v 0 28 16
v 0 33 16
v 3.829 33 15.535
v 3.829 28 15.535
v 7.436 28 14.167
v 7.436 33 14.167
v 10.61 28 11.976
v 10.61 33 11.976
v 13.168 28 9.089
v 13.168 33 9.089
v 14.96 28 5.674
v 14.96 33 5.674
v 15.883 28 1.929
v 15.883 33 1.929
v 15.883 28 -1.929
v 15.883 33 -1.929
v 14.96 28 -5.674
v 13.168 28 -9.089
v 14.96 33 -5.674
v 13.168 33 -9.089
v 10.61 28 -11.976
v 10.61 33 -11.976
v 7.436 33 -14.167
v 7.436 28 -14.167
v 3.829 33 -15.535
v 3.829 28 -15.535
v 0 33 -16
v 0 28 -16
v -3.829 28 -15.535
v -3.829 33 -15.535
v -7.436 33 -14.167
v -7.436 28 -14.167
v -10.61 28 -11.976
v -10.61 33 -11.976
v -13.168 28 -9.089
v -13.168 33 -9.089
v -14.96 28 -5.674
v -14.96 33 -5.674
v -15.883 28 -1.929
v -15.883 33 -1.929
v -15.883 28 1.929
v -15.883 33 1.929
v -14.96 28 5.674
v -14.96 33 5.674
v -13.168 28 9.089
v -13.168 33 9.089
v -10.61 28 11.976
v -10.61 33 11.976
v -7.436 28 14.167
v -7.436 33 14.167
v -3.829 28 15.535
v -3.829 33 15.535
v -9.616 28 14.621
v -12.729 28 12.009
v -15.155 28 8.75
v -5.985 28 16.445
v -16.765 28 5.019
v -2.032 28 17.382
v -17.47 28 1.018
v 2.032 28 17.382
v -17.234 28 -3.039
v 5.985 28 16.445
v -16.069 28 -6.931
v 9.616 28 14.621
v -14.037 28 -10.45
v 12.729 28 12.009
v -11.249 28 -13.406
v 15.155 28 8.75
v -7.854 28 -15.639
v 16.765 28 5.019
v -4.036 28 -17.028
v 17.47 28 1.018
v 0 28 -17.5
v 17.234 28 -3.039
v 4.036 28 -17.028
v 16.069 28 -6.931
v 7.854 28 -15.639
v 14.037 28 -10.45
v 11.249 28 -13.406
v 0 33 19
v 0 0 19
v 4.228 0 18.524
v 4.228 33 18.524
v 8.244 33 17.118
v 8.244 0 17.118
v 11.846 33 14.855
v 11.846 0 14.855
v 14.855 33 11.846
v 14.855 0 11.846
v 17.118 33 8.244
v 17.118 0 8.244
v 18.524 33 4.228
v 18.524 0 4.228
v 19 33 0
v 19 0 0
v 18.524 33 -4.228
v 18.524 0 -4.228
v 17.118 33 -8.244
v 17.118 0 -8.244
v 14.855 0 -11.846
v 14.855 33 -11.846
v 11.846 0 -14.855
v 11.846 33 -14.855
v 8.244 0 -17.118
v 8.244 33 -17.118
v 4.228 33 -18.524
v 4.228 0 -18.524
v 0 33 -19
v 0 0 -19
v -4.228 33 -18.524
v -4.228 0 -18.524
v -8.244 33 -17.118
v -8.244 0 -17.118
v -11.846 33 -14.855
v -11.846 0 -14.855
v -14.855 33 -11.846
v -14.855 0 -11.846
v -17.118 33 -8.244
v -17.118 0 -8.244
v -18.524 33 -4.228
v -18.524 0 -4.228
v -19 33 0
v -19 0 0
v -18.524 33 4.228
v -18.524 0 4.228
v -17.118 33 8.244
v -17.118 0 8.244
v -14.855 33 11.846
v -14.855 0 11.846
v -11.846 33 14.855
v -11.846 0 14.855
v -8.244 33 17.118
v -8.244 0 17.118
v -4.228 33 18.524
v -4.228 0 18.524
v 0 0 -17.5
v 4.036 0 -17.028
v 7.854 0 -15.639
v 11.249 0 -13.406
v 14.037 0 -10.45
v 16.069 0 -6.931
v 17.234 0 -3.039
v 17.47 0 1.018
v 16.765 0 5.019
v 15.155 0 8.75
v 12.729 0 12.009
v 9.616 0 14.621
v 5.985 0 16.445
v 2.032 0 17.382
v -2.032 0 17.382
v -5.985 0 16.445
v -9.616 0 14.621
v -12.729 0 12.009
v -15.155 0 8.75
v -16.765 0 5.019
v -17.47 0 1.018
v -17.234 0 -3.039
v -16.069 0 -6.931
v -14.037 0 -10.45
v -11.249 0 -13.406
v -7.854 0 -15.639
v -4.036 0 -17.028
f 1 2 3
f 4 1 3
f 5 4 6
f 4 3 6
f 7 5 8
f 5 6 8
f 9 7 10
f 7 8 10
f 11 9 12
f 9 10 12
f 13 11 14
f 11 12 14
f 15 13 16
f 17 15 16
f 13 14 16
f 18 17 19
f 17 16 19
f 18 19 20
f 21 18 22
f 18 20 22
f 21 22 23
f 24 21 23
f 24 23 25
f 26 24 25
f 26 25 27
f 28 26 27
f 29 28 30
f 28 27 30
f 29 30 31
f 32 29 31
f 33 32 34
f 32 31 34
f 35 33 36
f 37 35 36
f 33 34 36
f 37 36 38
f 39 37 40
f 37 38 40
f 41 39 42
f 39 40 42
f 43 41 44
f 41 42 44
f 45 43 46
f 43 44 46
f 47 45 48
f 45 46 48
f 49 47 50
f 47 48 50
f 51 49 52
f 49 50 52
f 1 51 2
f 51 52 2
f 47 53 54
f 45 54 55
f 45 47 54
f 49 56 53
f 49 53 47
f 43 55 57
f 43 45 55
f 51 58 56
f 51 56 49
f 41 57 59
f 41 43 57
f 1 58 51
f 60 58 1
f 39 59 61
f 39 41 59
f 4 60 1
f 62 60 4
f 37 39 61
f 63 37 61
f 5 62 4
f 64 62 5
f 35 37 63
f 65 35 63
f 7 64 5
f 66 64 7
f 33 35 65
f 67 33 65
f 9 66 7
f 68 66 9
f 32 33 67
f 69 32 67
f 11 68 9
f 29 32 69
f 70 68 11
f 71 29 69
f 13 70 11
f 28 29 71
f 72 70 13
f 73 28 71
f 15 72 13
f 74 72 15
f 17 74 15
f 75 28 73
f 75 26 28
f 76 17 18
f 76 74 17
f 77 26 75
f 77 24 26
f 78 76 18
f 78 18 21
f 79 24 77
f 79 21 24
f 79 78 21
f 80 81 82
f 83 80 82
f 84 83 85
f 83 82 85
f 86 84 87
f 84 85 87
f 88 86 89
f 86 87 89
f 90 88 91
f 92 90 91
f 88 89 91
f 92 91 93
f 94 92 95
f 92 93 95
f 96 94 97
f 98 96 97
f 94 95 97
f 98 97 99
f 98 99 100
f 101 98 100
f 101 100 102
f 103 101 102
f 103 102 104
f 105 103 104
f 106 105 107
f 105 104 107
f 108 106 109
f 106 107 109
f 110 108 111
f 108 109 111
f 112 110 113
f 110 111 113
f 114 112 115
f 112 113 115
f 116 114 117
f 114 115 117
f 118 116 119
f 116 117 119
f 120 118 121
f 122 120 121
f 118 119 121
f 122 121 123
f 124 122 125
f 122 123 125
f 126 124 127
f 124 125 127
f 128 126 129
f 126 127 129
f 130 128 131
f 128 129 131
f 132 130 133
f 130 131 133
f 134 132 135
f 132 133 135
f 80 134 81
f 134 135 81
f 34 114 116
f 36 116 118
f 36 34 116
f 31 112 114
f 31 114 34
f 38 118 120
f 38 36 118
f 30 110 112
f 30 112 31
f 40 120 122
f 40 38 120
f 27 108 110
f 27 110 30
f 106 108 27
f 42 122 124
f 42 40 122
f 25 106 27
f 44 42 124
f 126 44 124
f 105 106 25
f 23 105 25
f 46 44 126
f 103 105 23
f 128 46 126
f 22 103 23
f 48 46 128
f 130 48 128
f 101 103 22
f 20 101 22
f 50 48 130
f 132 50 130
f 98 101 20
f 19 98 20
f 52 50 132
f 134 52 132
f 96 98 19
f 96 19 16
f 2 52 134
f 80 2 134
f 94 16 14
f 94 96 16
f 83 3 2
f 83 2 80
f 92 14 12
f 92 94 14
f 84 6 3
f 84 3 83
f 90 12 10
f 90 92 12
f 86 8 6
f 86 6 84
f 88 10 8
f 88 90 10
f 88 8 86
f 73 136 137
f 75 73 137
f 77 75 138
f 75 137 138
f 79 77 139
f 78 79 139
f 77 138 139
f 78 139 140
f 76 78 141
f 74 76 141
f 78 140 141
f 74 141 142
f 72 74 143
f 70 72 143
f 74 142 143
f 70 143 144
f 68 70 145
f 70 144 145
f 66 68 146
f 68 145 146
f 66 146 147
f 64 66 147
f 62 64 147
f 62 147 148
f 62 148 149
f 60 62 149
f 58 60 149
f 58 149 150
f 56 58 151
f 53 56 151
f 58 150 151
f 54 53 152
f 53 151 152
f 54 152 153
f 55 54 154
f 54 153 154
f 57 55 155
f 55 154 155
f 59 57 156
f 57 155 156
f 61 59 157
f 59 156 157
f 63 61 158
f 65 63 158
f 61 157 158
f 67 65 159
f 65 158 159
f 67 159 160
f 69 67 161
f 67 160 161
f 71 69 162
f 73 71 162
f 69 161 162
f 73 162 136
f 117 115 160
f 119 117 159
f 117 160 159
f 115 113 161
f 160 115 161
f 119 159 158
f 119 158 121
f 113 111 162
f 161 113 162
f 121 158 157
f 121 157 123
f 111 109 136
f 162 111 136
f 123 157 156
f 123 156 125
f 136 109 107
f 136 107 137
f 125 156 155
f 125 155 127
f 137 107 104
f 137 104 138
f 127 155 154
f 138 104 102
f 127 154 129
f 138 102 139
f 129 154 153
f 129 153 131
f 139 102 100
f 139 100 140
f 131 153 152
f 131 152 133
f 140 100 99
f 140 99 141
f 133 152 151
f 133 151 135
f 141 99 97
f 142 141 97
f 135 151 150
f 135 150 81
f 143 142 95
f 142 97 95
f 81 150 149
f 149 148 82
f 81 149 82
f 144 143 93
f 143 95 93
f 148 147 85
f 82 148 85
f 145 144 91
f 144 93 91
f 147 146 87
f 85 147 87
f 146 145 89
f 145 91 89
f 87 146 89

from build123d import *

# Parameters (mm, degrees)
SKETCH1_R           = 19
BOSS_EXTRUDE1_DEPTH = 33
SKETCH2_R           = 16
CUT_EXTRUDE1_DEPTH  = 5
SKETCH3_R           = 17.5
CUT_EXTRUDE2_DEPTH  = 28


with BuildPart() as part:
    # Sketch1 → Boss-Extrude1 (new body)
    with BuildSketch(Plane(origin=(0, 0, 0), x_dir=(1, 0, 0), z_dir=(0, 1, 0))):
        with Locations(Location((0, 0, 0), (0, 0, 270))):
            Circle(SKETCH1_R)
    extrude(amount=BOSS_EXTRUDE1_DEPTH)

    # Sketch2 → Cut-Extrude1 (cut)
    with BuildSketch(Plane(origin=(0, 33, 0), x_dir=(1, 0, 0), z_dir=(0, 1, 0))):
        with Locations(Location((0, 0, 0), (0, 0, 270))):
            Circle(SKETCH2_R)
    extrude(amount=-CUT_EXTRUDE1_DEPTH, mode=Mode.SUBTRACT)

    # Sketch3 → Cut-Extrude2 (cut)
    with BuildSketch(Plane.XZ):
        with Locations(Location((0, 0, 0), (0, 0, 270))):
            Circle(SKETCH3_R)
    extrude(amount=-CUT_EXTRUDE2_DEPTH, mode=Mode.SUBTRACT)


solid = part.part
